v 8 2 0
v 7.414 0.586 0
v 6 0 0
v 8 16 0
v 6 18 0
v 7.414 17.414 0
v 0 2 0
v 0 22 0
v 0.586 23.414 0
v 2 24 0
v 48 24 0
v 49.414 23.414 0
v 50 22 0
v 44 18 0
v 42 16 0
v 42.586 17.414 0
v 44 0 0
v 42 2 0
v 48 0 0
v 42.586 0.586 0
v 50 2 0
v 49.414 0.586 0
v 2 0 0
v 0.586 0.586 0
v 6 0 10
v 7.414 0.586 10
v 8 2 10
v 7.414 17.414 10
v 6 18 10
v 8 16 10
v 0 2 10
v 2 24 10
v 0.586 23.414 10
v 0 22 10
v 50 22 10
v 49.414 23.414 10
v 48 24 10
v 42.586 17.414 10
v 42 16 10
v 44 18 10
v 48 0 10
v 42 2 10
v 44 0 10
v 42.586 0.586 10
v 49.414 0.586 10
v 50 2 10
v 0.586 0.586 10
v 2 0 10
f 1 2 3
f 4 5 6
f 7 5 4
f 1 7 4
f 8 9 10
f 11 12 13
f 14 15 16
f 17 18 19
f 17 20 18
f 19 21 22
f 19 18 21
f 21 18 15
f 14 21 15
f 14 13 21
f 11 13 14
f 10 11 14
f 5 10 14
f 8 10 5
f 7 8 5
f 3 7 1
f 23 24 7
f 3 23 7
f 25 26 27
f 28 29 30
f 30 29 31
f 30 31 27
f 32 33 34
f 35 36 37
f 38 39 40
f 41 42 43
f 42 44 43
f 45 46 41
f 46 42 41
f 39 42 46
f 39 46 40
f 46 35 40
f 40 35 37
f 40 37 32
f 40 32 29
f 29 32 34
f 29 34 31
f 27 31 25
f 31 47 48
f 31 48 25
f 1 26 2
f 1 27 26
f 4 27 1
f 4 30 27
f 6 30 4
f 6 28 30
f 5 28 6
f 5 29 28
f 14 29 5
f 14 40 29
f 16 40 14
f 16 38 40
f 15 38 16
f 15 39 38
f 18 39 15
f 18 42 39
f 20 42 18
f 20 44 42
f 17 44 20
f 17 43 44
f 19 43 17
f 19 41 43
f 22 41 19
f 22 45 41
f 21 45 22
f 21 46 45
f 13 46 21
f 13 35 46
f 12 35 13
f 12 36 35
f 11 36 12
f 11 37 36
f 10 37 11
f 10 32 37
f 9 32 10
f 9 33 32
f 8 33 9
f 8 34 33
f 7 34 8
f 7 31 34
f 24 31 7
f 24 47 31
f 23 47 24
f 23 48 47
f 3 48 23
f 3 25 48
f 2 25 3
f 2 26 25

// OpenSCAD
$fn = 32;

// ----------------------------------------------------------------------
// Clip blank: staple clip, 10 mm thick
// ----------------------------------------------------------------------

// --- parameters (mm) ---
profile_height = 10;      // extrusion height
profile_points = 24;      // points of the closed outline

profile = [[0, 2], [0.586, 0.586], [2, 0], [6, 0], [7.414, 0.586], [8, 2], [8, 16], [7.414, 17.414], [6, 18], [44, 18], [42.586, 17.414], [42, 16], [42, 2], [42.586, 0.586], [44, 0], [48, 0], [49.414, 0.586], [50, 2], [50, 22], [49.414, 23.414], [48, 24], [2, 24], [0.586, 23.414], [0, 22]];  // single closed polygon, 24 points, counter clockwise

// --- the one profile operation ---
linear_extrude(height = profile_height) polygon(points = profile);
